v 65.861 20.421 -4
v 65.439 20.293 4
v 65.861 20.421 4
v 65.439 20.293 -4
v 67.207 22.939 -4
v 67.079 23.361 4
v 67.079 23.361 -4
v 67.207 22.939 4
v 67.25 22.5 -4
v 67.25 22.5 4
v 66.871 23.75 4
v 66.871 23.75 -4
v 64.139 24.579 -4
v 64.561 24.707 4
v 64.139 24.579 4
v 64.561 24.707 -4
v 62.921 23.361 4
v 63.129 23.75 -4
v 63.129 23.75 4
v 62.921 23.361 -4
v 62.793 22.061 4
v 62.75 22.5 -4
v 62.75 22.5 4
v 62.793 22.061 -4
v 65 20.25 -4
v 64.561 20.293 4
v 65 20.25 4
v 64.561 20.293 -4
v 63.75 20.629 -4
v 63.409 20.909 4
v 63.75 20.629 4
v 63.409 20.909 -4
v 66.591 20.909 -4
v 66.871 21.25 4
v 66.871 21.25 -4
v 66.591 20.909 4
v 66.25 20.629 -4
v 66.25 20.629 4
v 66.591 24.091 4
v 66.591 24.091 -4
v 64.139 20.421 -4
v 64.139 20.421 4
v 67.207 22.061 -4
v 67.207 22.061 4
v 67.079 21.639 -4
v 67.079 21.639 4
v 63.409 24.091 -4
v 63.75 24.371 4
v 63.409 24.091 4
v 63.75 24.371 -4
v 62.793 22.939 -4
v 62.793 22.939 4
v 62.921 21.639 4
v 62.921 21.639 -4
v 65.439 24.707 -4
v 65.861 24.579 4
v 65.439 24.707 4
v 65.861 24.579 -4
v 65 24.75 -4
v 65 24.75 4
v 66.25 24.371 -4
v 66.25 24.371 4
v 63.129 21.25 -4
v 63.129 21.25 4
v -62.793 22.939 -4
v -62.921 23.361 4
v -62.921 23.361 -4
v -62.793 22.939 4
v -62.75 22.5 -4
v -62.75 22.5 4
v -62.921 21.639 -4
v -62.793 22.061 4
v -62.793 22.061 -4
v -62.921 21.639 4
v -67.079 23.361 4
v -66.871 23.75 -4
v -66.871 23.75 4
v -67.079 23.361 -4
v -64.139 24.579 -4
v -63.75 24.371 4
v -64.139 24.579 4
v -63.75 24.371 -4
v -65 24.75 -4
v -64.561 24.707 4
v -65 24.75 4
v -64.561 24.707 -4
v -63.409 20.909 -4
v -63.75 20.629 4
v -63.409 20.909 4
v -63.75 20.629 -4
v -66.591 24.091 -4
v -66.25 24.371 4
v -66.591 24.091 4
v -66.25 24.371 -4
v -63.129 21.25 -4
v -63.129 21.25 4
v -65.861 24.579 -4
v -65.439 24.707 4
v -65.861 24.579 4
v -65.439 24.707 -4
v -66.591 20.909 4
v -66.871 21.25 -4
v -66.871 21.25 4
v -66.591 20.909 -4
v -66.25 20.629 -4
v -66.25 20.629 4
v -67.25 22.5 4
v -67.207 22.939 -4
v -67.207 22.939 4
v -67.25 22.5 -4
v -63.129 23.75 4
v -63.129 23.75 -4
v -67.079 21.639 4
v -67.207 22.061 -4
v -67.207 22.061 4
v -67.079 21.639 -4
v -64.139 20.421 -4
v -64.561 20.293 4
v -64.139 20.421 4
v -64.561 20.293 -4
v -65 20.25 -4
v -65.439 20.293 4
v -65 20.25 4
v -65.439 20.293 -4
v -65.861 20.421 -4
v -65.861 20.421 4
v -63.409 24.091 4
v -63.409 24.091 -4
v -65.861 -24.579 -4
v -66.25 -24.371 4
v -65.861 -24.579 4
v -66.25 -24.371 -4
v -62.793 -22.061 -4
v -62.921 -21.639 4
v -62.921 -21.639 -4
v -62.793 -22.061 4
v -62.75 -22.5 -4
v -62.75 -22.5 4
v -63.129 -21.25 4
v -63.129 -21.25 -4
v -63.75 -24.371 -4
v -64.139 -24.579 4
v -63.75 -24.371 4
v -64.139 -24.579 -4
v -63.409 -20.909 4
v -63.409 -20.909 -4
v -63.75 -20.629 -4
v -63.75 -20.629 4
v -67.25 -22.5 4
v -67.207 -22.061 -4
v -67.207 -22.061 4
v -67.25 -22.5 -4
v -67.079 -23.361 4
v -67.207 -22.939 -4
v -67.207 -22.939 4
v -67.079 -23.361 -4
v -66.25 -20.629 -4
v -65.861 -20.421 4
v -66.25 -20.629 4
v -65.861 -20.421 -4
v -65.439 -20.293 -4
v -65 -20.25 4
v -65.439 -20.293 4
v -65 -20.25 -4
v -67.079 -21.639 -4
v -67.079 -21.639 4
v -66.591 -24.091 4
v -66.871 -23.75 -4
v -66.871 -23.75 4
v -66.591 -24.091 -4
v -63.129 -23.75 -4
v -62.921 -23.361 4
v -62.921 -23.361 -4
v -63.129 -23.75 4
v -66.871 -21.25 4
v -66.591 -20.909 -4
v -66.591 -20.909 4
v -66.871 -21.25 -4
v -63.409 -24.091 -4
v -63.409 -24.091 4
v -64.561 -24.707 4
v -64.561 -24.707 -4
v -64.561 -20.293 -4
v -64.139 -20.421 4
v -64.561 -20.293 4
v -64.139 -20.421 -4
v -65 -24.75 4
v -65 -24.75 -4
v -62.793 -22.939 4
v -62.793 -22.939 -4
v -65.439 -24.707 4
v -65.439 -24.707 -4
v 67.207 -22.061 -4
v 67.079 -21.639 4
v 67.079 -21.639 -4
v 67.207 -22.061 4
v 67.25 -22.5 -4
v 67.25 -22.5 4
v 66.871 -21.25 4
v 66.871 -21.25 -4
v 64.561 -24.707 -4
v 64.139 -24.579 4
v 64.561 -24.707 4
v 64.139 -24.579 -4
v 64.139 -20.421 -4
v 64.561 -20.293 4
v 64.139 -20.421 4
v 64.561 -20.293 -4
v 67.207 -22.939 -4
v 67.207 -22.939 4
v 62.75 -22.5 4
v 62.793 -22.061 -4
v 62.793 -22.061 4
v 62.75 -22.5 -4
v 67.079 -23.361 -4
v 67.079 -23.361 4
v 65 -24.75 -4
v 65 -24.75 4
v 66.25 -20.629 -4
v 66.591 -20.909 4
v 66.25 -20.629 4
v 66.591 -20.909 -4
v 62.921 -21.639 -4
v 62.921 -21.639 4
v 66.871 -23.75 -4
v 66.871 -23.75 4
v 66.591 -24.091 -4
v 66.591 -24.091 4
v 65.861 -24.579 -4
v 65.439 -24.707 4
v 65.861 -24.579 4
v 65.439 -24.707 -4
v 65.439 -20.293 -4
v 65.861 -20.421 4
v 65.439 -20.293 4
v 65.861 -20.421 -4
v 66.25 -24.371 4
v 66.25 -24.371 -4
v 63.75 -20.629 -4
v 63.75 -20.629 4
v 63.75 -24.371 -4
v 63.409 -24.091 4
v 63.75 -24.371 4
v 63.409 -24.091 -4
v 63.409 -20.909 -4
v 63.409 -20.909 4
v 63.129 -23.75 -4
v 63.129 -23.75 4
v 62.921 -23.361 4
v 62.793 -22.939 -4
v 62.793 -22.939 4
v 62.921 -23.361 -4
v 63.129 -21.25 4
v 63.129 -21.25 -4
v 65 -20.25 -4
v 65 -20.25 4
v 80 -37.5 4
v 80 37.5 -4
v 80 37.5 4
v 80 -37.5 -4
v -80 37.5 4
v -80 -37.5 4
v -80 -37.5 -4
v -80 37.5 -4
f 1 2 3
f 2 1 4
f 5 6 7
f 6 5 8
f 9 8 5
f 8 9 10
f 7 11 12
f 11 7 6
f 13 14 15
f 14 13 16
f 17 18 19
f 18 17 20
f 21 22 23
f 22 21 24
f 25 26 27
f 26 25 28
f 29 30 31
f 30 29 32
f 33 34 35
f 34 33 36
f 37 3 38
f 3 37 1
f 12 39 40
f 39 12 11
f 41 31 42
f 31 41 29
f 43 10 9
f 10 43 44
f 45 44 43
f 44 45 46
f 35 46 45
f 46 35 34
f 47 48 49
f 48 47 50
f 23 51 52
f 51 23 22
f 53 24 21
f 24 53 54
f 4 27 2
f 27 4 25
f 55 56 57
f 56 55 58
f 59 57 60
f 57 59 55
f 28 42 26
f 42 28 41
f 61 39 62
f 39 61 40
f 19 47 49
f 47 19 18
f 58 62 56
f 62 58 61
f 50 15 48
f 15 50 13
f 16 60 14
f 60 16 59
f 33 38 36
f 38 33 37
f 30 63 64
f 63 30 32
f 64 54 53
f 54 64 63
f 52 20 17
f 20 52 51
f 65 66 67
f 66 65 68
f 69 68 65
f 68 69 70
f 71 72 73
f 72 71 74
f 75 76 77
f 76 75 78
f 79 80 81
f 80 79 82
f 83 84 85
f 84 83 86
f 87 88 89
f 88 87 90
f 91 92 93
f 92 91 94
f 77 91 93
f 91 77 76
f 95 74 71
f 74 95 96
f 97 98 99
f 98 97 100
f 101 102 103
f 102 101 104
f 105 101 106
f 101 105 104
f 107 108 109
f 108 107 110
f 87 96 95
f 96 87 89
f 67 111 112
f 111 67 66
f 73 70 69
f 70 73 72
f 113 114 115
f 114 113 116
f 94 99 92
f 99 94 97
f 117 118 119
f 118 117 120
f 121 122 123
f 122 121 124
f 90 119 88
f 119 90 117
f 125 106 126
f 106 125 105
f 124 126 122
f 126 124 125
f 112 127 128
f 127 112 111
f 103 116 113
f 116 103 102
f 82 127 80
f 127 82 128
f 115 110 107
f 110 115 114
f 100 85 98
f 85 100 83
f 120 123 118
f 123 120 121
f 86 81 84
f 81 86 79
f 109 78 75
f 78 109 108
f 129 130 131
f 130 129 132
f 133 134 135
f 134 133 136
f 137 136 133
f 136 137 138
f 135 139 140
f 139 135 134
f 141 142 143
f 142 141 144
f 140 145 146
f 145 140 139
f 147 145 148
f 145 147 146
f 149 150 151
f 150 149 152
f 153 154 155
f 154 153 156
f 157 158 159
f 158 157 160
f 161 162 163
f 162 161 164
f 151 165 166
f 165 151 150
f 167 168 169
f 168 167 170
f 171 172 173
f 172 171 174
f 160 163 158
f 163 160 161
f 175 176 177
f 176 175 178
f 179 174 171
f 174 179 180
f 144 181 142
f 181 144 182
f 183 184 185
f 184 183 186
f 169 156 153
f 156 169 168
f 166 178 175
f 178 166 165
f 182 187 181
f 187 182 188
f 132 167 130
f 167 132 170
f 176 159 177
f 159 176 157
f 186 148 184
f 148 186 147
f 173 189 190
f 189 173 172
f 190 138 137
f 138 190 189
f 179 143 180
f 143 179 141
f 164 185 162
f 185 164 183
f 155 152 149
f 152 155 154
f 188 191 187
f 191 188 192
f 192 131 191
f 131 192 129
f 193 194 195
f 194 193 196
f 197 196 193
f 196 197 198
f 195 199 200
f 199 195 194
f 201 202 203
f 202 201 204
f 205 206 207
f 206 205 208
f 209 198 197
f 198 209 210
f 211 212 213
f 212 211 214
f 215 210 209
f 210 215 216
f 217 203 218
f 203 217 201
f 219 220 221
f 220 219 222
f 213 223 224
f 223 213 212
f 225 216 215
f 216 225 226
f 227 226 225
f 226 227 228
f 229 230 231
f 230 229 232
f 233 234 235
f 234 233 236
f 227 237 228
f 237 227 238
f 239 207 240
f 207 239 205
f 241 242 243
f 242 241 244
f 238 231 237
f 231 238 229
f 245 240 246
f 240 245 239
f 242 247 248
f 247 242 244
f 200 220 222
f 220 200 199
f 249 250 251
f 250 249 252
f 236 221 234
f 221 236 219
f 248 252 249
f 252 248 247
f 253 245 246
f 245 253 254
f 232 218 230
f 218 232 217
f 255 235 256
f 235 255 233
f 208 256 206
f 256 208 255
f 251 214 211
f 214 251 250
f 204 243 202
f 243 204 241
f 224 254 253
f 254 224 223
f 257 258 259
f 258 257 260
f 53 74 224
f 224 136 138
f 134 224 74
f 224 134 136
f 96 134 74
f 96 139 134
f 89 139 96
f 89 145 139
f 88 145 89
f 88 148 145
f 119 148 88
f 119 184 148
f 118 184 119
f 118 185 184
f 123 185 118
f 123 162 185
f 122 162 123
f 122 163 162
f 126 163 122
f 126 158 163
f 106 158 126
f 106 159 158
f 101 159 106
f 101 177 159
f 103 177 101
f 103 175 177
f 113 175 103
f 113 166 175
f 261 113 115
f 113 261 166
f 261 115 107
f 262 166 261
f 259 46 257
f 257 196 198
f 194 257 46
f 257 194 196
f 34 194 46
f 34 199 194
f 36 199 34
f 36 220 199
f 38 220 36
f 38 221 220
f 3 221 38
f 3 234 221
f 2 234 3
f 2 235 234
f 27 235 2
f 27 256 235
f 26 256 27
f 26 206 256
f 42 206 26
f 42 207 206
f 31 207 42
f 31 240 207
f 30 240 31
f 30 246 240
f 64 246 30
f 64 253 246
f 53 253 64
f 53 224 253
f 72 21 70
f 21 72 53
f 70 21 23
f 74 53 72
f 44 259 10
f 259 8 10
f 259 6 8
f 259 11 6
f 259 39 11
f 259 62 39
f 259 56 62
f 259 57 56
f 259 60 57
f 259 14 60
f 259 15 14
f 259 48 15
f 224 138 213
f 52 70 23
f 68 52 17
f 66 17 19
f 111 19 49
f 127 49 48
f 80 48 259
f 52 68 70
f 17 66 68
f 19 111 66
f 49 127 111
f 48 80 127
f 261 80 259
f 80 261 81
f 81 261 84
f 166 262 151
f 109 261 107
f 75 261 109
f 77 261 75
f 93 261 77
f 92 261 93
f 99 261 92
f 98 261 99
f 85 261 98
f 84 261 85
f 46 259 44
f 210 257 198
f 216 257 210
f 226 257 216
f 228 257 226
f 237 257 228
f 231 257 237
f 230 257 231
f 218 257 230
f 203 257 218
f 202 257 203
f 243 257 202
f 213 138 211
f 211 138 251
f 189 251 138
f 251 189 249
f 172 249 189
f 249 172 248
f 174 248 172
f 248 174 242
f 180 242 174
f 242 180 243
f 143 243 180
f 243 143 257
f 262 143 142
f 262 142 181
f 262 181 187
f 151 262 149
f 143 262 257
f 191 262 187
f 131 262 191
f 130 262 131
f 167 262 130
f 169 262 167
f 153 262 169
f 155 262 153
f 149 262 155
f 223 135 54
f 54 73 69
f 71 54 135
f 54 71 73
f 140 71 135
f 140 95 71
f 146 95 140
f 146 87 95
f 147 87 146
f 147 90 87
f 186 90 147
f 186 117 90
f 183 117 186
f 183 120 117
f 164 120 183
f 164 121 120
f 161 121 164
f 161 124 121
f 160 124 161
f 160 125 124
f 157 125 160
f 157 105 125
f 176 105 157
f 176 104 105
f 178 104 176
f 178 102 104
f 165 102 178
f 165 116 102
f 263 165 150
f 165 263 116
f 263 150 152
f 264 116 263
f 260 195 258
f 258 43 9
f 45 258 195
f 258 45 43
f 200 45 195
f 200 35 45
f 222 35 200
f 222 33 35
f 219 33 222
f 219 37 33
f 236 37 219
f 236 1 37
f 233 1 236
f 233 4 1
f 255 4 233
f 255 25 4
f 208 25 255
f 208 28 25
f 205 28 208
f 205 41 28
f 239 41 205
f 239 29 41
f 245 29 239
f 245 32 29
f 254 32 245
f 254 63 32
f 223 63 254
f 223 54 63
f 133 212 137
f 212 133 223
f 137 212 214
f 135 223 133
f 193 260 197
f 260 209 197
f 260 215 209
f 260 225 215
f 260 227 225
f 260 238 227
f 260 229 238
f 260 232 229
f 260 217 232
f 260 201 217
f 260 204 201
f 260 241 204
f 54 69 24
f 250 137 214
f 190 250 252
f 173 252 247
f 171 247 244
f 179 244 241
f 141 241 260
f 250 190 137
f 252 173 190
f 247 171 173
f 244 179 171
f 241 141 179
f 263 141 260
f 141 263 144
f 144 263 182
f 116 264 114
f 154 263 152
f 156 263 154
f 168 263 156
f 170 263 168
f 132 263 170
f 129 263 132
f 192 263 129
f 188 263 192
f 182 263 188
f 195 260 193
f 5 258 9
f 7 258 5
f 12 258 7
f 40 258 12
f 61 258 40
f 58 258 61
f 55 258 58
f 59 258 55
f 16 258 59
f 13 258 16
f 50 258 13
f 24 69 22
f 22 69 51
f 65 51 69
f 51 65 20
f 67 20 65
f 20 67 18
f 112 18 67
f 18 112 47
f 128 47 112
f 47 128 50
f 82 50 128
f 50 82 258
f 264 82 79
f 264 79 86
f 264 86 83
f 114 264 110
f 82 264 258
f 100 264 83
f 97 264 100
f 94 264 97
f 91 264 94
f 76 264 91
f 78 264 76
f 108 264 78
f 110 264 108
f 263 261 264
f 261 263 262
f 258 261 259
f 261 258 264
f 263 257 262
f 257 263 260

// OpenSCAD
$fn = 32;

// ----------------------------------------------------------------------
// Corner plate 160 x 75 x 8
// 4 holes, centres taken from the edge offset
// ----------------------------------------------------------------------

// --- parameters (mm) ---
plate = [160, 75, 8];  // overall size (x, y, z)
holes = 4;             // number of holes the drawing asks for
hole_d = 4.5;          // hole diameter
edge = 15;             // hole centre offset from the plate edge

// --- derived feature positions (mm) ---
corner_x = plate[0] / 2 - edge;  // = 65   corner hole X
corner_y = plate[1] / 2 - edge;  // = 22.5   corner hole Y
feature_centers = [
  [corner_x, corner_y],
  [-corner_x, corner_y],
  [-corner_x, -corner_y],
  [corner_x, -corner_y]
];   // hole centres the loop below drills

// plate outline, every hole drilled through with the same cutters
difference() {
  cube(plate, center = true);
  for (centre = feature_centers)
    translate([centre[0], centre[1], 0])
      cylinder(d = hole_d, h = plate[2] + 2, center = true);
}
